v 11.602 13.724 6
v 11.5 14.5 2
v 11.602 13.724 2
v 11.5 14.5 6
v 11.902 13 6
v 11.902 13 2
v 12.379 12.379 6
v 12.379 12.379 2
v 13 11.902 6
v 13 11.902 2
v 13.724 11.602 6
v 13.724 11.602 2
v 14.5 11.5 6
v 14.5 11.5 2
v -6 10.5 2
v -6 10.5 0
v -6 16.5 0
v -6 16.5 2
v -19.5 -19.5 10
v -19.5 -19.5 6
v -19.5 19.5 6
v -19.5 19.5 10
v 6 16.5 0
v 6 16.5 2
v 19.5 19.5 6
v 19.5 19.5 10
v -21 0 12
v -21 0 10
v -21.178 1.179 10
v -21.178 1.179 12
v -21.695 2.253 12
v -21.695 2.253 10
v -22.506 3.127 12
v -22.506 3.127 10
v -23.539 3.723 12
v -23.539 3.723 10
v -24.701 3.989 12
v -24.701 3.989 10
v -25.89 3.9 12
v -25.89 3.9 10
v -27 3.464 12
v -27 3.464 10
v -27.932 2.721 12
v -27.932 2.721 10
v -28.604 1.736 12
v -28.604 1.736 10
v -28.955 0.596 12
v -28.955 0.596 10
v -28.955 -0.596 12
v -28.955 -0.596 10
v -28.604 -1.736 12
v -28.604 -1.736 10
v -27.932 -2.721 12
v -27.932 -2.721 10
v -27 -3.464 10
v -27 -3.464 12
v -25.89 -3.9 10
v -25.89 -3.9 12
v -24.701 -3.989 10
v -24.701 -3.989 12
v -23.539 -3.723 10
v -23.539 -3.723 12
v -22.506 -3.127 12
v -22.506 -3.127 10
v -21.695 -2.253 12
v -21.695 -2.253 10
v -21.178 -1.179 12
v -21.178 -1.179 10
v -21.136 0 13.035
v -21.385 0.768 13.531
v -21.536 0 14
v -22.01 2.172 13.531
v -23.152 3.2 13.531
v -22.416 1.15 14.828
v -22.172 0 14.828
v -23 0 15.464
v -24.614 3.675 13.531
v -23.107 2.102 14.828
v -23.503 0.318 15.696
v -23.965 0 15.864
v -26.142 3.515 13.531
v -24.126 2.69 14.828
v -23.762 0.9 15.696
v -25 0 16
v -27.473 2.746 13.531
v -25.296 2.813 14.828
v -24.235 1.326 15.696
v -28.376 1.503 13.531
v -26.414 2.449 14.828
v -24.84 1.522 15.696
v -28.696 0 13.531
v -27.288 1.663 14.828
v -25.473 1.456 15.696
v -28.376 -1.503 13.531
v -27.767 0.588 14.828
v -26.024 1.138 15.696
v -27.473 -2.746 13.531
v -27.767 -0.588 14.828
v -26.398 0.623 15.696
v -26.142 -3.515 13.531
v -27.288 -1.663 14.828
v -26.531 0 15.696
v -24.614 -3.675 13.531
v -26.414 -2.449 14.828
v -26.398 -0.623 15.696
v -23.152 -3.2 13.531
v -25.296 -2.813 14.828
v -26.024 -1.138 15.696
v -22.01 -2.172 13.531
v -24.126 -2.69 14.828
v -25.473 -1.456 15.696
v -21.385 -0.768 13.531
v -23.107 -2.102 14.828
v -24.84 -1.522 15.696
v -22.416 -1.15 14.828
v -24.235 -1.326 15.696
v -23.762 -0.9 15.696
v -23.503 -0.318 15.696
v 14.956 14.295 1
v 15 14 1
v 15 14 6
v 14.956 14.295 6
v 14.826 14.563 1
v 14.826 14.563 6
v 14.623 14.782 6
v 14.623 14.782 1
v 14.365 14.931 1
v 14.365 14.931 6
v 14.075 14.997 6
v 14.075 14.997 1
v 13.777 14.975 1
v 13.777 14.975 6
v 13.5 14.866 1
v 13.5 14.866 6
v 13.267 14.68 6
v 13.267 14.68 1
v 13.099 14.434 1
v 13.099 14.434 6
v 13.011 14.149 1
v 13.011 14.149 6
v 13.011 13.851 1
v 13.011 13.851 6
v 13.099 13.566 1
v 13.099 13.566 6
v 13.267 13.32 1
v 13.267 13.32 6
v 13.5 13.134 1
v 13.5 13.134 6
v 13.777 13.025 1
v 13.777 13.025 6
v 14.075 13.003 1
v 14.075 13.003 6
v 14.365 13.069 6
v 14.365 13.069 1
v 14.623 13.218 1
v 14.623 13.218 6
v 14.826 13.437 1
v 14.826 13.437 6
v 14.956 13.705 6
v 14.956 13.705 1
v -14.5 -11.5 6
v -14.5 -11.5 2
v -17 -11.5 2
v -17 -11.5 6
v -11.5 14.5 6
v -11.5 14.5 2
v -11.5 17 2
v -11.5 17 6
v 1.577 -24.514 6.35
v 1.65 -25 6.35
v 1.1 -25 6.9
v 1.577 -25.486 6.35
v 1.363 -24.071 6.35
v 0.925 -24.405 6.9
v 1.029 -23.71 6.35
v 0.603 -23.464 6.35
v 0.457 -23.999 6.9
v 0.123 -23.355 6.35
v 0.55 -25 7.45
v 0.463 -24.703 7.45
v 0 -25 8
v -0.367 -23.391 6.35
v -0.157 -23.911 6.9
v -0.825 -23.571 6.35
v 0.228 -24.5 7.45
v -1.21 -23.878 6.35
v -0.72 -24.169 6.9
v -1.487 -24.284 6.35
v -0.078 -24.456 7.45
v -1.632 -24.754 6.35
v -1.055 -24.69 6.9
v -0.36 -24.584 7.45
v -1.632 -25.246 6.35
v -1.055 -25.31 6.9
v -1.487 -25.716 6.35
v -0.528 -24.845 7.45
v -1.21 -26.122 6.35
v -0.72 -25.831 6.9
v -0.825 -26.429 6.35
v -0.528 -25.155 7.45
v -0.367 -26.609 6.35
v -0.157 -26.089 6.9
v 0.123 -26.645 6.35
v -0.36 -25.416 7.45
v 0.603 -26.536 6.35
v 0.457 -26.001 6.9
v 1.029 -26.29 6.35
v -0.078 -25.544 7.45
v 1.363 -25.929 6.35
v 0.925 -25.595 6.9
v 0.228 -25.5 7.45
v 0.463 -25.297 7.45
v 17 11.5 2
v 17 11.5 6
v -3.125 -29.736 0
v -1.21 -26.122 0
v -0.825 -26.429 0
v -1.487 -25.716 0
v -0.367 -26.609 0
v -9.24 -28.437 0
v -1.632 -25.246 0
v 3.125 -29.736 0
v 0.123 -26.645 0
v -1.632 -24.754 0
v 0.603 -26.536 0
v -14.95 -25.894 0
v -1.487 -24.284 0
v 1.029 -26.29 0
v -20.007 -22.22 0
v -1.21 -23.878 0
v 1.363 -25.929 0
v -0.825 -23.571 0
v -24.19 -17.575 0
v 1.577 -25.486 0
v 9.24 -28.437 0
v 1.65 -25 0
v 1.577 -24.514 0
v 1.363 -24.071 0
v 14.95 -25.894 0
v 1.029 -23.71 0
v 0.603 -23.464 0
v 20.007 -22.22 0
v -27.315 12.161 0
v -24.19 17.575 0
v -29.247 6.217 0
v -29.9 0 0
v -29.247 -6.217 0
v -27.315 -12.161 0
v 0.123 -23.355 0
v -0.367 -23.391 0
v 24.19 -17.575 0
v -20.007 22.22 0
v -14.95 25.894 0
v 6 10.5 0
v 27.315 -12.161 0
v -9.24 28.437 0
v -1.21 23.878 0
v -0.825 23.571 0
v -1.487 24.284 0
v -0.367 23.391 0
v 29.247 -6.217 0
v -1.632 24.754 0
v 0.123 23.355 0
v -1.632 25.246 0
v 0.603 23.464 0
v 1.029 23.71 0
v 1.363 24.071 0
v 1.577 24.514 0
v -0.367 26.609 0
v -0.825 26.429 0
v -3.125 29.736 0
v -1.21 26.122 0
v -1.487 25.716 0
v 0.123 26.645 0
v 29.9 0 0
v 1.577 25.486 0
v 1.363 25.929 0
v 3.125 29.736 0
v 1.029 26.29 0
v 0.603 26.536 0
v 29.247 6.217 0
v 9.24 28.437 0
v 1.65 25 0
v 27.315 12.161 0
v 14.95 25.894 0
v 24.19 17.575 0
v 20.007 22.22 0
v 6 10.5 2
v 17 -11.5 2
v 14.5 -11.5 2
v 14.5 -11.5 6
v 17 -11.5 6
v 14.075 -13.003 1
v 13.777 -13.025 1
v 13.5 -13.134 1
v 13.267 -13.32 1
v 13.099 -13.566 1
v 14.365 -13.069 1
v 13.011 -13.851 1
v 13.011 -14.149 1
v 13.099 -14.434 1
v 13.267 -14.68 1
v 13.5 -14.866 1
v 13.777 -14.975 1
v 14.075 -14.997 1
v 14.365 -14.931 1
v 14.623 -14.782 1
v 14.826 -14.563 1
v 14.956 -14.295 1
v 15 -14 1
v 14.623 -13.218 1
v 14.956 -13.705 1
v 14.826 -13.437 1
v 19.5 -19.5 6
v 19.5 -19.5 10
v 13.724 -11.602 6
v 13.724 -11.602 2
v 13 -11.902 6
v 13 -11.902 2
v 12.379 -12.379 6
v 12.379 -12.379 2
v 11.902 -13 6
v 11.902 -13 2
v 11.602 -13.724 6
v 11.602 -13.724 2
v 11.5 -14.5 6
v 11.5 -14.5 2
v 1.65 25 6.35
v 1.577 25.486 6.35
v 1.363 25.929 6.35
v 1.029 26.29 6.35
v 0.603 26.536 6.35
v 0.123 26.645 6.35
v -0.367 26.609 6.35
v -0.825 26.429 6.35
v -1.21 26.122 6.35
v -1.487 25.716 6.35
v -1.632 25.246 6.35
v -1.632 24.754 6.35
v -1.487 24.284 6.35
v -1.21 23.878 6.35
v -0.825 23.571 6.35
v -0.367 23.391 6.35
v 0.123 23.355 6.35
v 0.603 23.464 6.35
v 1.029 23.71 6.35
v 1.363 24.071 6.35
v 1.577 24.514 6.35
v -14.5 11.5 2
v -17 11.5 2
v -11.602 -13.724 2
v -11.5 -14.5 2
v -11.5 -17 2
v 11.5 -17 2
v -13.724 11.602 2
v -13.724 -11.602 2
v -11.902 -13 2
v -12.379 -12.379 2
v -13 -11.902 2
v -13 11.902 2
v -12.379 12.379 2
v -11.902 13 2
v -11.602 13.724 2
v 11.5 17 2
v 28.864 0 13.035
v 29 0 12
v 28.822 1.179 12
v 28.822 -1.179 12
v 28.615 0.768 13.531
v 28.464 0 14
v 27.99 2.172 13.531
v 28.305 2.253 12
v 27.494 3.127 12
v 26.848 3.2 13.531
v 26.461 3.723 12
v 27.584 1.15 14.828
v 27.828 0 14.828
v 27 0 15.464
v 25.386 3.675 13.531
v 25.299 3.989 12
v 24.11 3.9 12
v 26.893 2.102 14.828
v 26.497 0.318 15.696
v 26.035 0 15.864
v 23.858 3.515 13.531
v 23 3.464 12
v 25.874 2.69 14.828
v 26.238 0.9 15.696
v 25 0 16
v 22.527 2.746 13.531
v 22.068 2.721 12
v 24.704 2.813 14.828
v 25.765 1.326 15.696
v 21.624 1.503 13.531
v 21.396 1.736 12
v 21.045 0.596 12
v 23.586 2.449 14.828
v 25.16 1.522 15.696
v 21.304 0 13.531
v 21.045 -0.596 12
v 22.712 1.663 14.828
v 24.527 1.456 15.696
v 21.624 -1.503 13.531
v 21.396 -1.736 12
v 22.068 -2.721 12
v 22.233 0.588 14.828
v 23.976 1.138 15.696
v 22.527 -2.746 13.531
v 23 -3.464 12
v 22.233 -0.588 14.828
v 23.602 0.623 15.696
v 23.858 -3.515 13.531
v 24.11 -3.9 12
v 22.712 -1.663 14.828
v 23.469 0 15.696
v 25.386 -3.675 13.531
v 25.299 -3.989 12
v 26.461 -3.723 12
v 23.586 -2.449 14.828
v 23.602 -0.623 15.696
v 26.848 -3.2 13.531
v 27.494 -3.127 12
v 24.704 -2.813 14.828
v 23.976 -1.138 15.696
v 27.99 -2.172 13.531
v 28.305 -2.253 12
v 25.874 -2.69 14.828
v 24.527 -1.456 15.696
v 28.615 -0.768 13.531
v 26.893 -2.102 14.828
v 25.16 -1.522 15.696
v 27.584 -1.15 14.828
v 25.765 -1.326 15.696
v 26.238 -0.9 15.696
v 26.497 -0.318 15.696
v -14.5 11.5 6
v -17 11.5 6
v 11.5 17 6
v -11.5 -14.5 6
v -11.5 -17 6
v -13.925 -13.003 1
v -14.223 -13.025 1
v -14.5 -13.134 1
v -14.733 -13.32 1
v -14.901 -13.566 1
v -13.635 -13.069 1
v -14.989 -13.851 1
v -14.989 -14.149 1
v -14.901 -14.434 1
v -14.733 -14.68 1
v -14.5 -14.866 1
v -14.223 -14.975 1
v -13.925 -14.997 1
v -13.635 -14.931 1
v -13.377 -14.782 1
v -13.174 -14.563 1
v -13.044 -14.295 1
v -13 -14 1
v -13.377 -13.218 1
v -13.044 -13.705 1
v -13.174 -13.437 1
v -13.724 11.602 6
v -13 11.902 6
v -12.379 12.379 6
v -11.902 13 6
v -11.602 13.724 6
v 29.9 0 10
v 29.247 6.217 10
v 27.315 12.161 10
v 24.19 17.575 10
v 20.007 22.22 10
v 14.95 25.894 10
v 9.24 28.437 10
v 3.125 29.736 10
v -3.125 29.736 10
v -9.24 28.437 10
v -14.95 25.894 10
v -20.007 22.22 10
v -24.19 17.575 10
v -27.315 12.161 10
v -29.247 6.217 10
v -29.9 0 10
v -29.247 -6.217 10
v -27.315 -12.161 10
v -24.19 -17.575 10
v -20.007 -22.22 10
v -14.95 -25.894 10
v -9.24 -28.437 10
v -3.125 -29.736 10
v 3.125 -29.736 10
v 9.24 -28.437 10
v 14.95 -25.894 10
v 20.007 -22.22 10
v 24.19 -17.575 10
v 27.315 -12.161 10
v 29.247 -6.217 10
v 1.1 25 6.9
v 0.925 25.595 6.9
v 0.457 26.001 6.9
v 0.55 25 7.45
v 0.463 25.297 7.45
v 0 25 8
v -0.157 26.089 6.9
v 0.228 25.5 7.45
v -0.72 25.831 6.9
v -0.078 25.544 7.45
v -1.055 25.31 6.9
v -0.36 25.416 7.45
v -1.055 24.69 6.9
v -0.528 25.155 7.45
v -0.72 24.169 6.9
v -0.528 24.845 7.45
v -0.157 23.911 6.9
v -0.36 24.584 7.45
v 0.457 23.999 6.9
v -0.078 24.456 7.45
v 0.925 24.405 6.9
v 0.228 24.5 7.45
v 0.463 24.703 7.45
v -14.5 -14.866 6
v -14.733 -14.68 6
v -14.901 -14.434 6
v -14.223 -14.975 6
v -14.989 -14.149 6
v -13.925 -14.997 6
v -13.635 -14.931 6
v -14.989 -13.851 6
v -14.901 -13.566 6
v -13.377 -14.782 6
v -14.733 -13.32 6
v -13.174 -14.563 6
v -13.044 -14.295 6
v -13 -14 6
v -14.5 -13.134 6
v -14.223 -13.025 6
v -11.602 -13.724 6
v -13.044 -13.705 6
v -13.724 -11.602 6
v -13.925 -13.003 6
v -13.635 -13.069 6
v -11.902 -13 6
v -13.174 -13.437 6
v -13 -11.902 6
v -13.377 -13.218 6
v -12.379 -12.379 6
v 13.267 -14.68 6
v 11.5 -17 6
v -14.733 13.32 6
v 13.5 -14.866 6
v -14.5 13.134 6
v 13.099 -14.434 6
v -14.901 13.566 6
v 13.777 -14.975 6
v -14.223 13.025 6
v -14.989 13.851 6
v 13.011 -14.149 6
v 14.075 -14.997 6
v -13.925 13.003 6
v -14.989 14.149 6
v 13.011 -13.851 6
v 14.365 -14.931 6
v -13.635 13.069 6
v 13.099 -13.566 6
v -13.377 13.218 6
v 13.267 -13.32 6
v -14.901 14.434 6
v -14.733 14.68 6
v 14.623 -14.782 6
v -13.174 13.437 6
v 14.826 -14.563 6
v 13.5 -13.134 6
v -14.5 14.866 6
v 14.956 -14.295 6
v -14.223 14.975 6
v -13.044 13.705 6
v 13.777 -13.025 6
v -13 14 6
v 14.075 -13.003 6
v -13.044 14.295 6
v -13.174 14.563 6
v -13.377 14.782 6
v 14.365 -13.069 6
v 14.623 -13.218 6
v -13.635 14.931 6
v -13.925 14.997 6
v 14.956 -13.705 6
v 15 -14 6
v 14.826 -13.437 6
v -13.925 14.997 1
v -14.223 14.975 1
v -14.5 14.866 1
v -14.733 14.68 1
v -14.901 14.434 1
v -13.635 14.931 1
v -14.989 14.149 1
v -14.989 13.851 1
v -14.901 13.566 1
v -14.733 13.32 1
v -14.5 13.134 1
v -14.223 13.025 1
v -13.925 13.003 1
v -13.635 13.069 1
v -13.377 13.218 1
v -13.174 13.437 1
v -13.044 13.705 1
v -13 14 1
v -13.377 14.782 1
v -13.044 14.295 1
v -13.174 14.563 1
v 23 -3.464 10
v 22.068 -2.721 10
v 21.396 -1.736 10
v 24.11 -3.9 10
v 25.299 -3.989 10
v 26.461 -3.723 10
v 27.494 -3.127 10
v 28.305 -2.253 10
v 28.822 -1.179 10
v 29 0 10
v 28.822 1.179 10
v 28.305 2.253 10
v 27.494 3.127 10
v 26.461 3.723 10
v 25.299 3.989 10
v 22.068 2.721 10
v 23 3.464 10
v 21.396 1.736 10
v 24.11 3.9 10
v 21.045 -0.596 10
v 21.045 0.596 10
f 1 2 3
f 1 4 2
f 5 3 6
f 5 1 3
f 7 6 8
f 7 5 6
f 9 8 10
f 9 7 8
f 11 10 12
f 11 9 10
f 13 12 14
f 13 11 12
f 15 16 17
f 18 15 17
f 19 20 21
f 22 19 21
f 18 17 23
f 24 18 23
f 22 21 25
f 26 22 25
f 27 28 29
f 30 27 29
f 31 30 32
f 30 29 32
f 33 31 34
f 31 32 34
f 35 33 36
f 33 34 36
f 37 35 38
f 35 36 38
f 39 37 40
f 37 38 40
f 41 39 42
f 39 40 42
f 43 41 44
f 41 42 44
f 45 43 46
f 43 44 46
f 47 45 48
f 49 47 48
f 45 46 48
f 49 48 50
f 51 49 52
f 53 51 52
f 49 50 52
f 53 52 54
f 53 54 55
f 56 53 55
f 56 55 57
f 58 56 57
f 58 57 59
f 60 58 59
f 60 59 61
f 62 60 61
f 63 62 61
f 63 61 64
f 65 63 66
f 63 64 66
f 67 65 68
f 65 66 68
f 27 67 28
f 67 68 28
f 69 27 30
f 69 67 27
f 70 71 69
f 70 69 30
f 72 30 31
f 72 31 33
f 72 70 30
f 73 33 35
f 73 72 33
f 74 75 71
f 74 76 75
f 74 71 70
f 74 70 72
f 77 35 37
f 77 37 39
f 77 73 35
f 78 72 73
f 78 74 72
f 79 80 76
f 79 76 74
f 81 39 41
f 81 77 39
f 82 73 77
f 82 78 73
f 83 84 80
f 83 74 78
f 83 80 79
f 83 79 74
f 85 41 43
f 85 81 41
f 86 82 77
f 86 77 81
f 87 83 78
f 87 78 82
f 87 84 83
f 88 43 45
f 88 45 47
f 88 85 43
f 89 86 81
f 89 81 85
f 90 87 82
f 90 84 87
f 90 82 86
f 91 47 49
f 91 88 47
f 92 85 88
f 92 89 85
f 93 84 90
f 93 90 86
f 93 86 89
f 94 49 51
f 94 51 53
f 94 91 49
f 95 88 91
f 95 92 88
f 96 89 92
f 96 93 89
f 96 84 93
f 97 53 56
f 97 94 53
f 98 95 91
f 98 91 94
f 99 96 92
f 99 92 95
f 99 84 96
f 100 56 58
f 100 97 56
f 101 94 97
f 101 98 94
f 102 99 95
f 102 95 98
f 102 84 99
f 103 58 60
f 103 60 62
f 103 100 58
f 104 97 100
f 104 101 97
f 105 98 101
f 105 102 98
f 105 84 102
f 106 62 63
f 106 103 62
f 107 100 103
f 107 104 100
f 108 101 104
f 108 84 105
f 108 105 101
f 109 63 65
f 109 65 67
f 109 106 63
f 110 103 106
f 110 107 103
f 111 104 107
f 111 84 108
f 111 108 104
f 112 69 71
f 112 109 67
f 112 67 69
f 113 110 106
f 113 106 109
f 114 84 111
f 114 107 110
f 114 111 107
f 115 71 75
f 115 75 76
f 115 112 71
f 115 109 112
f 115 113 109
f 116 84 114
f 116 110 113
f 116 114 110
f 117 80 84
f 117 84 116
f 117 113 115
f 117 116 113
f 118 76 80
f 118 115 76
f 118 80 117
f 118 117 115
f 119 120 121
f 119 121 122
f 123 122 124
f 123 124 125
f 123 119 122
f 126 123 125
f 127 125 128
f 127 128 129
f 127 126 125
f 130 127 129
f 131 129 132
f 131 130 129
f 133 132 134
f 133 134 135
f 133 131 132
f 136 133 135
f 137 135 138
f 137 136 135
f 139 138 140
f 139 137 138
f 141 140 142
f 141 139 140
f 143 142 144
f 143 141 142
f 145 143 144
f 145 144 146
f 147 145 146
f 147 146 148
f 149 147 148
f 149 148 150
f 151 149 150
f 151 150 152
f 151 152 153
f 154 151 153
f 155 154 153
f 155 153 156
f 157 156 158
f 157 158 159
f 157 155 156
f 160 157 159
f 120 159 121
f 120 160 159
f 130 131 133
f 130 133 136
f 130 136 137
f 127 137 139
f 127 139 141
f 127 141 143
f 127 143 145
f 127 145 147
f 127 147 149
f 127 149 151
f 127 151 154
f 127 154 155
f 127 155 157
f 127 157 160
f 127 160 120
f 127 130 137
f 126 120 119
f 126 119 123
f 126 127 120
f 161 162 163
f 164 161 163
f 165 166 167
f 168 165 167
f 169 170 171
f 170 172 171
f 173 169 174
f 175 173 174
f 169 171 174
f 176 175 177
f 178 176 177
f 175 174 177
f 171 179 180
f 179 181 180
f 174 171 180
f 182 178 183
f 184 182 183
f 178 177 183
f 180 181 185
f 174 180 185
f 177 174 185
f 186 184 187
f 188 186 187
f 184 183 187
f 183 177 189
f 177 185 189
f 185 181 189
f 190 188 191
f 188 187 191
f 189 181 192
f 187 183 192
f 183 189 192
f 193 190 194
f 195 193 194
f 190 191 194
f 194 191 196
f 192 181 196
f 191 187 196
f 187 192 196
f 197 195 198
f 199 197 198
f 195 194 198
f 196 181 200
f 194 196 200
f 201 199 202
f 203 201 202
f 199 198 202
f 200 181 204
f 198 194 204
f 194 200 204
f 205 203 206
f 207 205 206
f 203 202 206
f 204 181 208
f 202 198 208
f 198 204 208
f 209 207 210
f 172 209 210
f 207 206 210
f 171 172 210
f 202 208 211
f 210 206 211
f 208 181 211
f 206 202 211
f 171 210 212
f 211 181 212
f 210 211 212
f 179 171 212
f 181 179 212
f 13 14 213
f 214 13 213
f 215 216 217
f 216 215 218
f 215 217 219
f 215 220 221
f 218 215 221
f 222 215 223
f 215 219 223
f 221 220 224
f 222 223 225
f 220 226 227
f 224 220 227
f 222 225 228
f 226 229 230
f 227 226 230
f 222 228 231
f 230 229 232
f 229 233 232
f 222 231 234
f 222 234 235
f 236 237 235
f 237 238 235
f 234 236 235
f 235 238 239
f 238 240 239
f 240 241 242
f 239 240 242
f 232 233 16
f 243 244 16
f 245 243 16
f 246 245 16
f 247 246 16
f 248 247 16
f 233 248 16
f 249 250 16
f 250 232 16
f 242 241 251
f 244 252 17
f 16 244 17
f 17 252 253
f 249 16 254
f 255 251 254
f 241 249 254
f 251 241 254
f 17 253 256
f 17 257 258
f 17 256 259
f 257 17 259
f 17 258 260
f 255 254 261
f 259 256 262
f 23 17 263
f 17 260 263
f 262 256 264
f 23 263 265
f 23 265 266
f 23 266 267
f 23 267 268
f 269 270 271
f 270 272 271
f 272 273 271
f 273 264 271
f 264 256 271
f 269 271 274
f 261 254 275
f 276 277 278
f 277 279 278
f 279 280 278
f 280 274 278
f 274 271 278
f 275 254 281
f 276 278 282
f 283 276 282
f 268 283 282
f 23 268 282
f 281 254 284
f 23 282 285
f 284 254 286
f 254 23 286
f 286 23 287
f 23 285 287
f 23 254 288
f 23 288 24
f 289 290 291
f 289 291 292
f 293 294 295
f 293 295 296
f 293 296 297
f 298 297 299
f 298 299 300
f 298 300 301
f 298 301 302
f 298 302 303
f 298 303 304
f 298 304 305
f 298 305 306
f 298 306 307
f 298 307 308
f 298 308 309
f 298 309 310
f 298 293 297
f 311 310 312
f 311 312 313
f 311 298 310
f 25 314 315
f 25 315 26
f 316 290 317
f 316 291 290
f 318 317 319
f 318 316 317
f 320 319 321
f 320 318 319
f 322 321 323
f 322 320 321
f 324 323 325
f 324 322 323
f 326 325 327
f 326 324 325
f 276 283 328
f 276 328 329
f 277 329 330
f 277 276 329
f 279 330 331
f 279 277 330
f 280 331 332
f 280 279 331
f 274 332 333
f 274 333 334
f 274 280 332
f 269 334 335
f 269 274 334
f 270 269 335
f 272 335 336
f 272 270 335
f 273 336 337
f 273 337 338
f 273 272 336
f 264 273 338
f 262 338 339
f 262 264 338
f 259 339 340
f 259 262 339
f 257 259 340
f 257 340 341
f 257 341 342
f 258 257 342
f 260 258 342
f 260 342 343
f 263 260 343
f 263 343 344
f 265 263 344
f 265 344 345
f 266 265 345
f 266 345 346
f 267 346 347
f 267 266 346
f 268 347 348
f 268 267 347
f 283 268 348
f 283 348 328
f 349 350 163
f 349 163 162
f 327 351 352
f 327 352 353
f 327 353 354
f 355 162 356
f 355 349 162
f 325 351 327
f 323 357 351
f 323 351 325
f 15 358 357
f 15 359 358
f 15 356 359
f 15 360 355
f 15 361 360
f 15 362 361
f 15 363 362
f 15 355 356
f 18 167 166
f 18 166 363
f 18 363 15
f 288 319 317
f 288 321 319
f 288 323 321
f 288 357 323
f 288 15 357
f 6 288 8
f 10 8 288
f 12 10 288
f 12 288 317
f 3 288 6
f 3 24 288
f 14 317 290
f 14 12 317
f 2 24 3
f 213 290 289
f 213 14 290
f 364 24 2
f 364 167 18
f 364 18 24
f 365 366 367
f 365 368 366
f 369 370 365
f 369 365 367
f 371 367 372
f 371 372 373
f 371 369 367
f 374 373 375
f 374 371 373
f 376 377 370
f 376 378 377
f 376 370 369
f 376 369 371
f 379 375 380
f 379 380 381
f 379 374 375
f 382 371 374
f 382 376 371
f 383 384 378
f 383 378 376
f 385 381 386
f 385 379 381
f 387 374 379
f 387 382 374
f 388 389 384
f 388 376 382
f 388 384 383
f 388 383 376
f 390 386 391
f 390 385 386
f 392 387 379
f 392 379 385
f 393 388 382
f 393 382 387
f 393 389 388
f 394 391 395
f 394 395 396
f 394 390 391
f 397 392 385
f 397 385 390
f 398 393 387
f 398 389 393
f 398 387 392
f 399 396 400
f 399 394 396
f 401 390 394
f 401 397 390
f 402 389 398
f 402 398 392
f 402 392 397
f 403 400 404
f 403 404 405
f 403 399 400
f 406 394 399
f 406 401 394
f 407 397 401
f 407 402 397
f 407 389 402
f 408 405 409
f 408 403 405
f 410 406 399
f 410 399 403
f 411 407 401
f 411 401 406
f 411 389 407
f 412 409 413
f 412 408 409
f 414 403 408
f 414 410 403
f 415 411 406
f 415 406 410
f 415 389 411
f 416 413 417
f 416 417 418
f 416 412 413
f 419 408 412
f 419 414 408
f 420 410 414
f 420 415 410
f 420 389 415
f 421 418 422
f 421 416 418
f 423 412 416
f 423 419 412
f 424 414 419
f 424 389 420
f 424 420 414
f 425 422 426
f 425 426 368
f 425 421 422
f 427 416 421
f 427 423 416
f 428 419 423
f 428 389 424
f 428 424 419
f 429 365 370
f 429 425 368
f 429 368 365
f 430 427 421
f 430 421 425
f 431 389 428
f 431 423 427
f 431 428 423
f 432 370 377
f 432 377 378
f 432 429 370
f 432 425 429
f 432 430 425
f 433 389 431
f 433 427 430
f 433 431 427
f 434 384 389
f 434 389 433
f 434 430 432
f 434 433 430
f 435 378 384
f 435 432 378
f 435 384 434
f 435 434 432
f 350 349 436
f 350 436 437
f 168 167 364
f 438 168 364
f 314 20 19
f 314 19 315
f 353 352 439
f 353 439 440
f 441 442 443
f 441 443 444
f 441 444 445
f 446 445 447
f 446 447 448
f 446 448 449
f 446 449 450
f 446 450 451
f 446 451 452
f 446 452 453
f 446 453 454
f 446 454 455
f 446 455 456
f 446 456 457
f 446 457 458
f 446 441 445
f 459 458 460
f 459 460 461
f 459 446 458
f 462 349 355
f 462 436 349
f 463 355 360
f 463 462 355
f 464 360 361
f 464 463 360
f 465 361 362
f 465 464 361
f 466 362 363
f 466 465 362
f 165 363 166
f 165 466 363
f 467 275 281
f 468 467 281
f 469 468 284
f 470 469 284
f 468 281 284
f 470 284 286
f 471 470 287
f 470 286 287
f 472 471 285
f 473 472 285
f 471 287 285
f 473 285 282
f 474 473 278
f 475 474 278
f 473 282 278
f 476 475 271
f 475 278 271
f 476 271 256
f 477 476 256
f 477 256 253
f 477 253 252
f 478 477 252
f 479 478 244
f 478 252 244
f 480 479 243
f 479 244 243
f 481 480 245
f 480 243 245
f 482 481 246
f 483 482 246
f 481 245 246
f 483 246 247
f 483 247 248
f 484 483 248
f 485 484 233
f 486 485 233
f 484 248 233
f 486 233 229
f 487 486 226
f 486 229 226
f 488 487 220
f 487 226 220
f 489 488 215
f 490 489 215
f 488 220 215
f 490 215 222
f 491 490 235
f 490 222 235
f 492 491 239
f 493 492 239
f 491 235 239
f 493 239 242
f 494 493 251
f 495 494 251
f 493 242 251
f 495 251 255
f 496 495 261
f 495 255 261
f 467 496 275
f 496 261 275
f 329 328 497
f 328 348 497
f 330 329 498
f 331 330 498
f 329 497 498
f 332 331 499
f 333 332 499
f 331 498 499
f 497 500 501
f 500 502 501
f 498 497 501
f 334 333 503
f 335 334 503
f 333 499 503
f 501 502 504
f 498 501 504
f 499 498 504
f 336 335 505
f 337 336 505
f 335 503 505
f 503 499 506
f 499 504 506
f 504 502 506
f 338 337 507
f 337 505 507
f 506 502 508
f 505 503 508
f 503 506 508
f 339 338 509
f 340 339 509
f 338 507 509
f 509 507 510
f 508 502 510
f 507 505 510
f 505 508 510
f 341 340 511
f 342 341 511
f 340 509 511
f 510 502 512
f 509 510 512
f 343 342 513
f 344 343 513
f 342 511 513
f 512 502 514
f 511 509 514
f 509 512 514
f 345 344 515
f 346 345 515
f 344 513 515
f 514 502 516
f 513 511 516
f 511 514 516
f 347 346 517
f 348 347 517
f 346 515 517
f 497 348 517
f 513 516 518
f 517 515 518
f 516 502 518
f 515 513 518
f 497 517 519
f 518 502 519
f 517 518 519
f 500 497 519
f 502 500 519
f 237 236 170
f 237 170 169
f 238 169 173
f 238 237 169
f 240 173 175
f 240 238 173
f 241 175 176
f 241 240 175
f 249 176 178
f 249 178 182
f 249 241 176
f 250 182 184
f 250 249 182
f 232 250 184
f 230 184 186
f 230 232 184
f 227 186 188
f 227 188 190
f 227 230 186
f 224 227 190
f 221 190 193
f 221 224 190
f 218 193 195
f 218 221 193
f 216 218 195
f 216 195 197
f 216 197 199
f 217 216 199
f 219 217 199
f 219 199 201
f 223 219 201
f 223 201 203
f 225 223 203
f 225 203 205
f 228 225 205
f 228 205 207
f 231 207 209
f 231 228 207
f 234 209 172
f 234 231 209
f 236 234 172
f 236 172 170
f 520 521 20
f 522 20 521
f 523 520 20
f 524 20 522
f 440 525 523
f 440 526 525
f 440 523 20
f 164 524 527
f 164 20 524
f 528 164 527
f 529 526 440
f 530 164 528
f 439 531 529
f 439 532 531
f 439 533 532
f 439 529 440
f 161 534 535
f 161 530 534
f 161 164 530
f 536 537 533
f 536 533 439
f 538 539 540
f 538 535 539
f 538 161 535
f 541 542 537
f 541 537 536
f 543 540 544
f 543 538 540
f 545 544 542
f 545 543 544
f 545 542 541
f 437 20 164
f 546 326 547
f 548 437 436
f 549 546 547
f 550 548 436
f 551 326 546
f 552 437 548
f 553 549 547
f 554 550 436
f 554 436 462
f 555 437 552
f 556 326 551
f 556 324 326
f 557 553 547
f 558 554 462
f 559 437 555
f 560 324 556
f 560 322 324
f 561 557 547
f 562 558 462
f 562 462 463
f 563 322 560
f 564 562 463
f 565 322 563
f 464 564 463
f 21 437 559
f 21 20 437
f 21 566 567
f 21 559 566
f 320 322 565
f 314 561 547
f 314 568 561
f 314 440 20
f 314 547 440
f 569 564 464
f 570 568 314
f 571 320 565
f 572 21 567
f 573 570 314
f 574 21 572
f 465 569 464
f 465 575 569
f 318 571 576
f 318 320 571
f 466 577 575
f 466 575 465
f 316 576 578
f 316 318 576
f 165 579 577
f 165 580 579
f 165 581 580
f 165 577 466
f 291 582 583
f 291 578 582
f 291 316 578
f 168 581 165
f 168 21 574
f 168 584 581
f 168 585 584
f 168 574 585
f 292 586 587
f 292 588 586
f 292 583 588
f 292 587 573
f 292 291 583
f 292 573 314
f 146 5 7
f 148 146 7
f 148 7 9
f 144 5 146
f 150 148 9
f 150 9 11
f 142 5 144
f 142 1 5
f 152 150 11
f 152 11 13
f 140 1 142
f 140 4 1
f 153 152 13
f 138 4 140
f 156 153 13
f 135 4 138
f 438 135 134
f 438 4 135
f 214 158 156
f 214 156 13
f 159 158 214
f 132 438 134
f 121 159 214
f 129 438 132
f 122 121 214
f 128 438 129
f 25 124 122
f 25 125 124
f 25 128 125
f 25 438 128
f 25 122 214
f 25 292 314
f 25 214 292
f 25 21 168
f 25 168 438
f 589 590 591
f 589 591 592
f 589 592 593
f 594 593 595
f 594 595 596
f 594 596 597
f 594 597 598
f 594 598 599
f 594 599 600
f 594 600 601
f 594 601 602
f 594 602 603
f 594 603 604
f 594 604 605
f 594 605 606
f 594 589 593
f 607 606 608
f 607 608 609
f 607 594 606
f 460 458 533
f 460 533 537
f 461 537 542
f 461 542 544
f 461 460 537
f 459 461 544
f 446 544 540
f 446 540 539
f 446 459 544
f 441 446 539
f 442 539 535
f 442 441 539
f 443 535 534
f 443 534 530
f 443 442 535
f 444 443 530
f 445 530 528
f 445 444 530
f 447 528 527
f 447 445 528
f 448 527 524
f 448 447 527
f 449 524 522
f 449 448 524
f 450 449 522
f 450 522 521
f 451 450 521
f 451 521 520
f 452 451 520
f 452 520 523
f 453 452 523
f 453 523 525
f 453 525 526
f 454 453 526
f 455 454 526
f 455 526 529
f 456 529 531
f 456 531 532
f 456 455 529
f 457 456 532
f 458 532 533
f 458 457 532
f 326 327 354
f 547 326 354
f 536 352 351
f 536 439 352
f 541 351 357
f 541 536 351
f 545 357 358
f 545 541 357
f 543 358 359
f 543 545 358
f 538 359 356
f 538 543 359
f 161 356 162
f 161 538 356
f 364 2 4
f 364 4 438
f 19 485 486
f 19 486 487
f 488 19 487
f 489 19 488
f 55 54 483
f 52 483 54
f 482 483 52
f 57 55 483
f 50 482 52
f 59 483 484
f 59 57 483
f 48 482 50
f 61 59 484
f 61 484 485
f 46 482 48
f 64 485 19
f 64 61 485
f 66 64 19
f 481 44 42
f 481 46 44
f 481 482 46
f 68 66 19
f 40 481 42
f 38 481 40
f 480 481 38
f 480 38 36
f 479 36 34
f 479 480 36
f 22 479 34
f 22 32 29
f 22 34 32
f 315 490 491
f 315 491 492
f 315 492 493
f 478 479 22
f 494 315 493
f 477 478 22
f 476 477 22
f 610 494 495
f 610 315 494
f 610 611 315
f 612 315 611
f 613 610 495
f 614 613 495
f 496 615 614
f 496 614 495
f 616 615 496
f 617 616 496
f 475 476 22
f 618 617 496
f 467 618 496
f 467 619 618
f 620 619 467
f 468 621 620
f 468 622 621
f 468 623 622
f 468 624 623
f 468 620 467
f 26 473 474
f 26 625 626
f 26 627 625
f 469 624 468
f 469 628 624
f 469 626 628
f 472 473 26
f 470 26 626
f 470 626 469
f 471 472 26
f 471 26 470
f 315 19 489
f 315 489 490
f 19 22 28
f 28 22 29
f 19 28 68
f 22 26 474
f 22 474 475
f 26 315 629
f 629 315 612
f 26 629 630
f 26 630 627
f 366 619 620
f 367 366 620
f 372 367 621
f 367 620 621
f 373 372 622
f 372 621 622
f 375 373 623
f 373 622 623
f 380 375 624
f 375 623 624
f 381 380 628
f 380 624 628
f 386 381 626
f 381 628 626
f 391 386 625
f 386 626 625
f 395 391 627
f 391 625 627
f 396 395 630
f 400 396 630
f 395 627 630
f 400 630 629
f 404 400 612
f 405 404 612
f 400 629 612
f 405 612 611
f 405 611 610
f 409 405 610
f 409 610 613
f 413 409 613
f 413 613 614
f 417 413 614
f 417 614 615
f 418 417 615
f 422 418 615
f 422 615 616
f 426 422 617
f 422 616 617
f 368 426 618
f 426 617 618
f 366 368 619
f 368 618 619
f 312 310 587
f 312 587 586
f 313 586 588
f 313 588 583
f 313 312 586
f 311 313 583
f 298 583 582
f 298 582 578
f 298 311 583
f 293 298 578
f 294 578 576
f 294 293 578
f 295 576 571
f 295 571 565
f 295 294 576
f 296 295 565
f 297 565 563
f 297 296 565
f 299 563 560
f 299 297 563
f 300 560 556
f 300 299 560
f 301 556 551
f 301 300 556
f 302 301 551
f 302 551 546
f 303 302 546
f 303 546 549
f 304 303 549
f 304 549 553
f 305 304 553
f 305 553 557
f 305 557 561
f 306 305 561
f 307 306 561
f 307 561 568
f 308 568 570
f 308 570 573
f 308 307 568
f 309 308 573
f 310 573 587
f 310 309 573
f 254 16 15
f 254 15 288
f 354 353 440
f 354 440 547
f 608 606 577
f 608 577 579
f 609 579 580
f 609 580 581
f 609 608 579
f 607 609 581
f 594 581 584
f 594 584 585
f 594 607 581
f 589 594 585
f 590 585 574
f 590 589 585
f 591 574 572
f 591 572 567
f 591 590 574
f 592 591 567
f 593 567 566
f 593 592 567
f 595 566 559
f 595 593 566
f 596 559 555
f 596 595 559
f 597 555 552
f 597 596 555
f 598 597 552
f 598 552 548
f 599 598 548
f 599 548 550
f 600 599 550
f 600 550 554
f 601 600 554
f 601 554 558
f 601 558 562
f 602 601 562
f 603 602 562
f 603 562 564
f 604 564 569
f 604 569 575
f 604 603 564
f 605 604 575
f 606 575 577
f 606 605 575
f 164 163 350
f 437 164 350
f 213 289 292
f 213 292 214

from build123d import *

# Parameters (mm, degrees)
CYLINDER003_R             = 1
CYLINDER003_DEPTH         = 5
CYLINDER001_R             = 1
CYLINDER001_DEPTH         = 5
CYLINDER002_R             = 1
CYLINDER002_DEPTH         = 5
BOX_W                     = 12
BOX_H                     = 6
BOX_DEPTH                 = 2
CYLINDER009_R             = 1.65
CYLINDER009_DEPTH         = 8
CHAMFER_SIZE              = 1.65
CYLINDER010_R             = 1.65
CYLINDER010_DEPTH         = 8
CHAMFER001_SIZE           = 1.65
CYLINDER_R                = 1
CYLINDER_DEPTH            = 5
BOX003_W                  = 34
BOX003_H                  = 34
BOX003_DEPTH              = 8
BOX002_W                  = 39
BOX002_H                  = 39
BOX002_DEPTH              = 4
CYLINDER004_R             = 29.9
CYLINDER004_DEPTH         = 10
CYLINDER006_R             = 4
CYLINDER006_DEPTH         = 6
FILLET004_R               = 4
CYLINDER008_R             = 4
CYLINDER008_DEPTH         = 6
FILLET005_R               = 4
BOX004_W                  = 5.5
BOX004_H                  = 5.5
BOX004_DEPTH              = 4
FILLET002_R               = 3
FILLET002_PLACEMENT_ANGLE = 180
FILLET001_R               = 3
FILLET001_PLACEMENT_ANGLE = 90
FILLET_R                  = 3
FILLET003_R               = 3
FILLET003_PLACEMENT_ANGLE = 90


with BuildPart() as cylinder003:
    # Cylinder003 → Cylinder003 (new body)
    with BuildSketch(Plane(origin=(14, -14, 1), x_dir=(1, 0, 0), z_dir=(0, 0, 1))):
        Circle(CYLINDER003_R)
    extrude(amount=CYLINDER003_DEPTH)


with BuildPart() as cylinder001:
    # Cylinder001 → Cylinder001 (new body)
    with BuildSketch(Plane(origin=(-14, 14, 1), x_dir=(1, 0, 0), z_dir=(0, 0, 1))):
        Circle(CYLINDER001_R)
    extrude(amount=CYLINDER001_DEPTH)


with BuildPart() as cylinder002:
    # Cylinder002 → Cylinder002 (new body)
    with BuildSketch(Plane(origin=(-14, -14, 1), x_dir=(1, 0, 0), z_dir=(0, 0, 1))):
        Circle(CYLINDER002_R)
    extrude(amount=CYLINDER002_DEPTH)


with BuildPart() as aussparung_usb_kabel:
    # Box → Box (new body)
    with BuildSketch(Plane(origin=(-6, 10.5, 0), x_dir=(1, 0, 0), z_dir=(0, 0, 1))):
        with Locations((6, 3)):
            Rectangle(BOX_W, BOX_H)
    extrude(amount=BOX_DEPTH)


with BuildPart() as chamfer001:
    # Cylinder009 → Cylinder009 (new body)
    with BuildSketch(Plane(origin=(0, -25, 0), x_dir=(1, 0, 0), z_dir=(0, 0, 1))):
        Circle(CYLINDER009_R)
    extrude(amount=CYLINDER009_DEPTH)

    # Chamfer
    chamfer_edges = [chamfer001.edges().sort_by_distance(p)[0] for p in [
        (-1.65, -25, 8),
    ]]
    chamfer(chamfer_edges, length=CHAMFER_SIZE)


with BuildPart() as chamfer002:
    # Cylinder010 → Cylinder010 (new body)
    with BuildSketch(Plane(origin=(0, 25, 0), x_dir=(1, 0, 0), z_dir=(0, 0, 1))):
        Circle(CYLINDER010_R)
    extrude(amount=CYLINDER010_DEPTH)

    # Chamfer001
    chamfer001_edges = [chamfer002.edges().sort_by_distance(p)[0] for p in [
        (-1.65, 25, 8),
    ]]
    chamfer(chamfer001_edges, length=CHAMFER001_SIZE)


with BuildPart() as bohrloecher:
    # Cylinder → Cylinder (new body)
    with BuildSketch(Plane(origin=(14, 14, 1), x_dir=(1, 0, 0), z_dir=(0, 0, 1))):
        Circle(CYLINDER_R)
    extrude(amount=CYLINDER_DEPTH)

    # Fusion: union Cylinder003, Cylinder001, Cylinder002, Aussparung_USB_Kabel, Chamfer001, Chamfer002
    add(cylinder003.part)
    add(cylinder001.part)
    add(cylinder002.part)
    add(aussparung_usb_kabel.part)
    add(chamfer001.part)
    add(chamfer002.part)


with BuildPart() as rahmen_innen:
    # Box003 → Box003 (new body)
    with BuildSketch(Plane(origin=(-17, -17, 2), x_dir=(1, 0, 0), z_dir=(0, 0, 1))):
        with Locations((17, 17)):
            Rectangle(BOX003_W, BOX003_H)
    extrude(amount=BOX003_DEPTH)


with BuildPart() as rahmen_aussen:
    # Box002 → Box002 (new body)
    with BuildSketch(Plane(origin=(-19.5, -19.5, 6), x_dir=(1, 0, 0), z_dir=(0, 0, 1))):
        with Locations((19.5, 19.5)):
            Rectangle(BOX002_W, BOX002_H)
    extrude(amount=BOX002_DEPTH)


with BuildPart() as cut001:
    # Cylinder004 → Cylinder004 (new body)
    with BuildSketch(Plane.XY):
        Circle(CYLINDER004_R)
    extrude(amount=CYLINDER004_DEPTH)

    # Cut: cut Rahmen_Aussen
    add(rahmen_aussen.part, mode=Mode.SUBTRACT)

    # Cut001: cut Rahmen_Innen
    add(rahmen_innen.part, mode=Mode.SUBTRACT)


with BuildPart() as fillet004:
    # Cylinder006 → Cylinder006 (new body)
    with BuildSketch(Plane(origin=(-25, 0, 10), x_dir=(1, 0, 0), z_dir=(0, 0, 1))):
        Circle(CYLINDER006_R)
    extrude(amount=CYLINDER006_DEPTH)

    # Fillet004
    fillet004_edges = [fillet004.edges().sort_by_distance(p)[0] for p in [
        (-29, 0, 16),
    ]]
    fillet(fillet004_edges, radius=FILLET004_R)


with BuildPart() as fillet005:
    # Cylinder008 → Cylinder008 (new body)
    with BuildSketch(Plane(origin=(25, 0, 10), x_dir=(1, 0, 0), z_dir=(0, 0, 1))):
        Circle(CYLINDER008_R)
    extrude(amount=CYLINDER008_DEPTH)

    # Fillet005
    fillet005_edges = [fillet005.edges().sort_by_distance(p)[0] for p in [
        (21, 0, 16),
    ]]
    fillet(fillet005_edges, radius=FILLET005_R)


with BuildPart() as w_rfel_eck:
    # Box004 → Box004 (new body)
    with BuildSketch(Plane(origin=(11.5, 11.5, 2), x_dir=(1, 0, 0), z_dir=(0, 0, 1))):
        with Locations((2.75, 2.75)):
            Rectangle(BOX004_W, BOX004_H)
    extrude(amount=BOX004_DEPTH)


with BuildPart() as fillet002:
    # Fillet002 base: copy of Würfel_Eck
    add(w_rfel_eck.part)

    # Fillet002
    fillet002_edges = [fillet002.edges().sort_by_distance(p)[0] for p in [
        (11.5, 11.5, 4),
    ]]
    fillet(fillet002_edges, radius=FILLET002_R)


with BuildPart() as fillet002_1:
    # Fillet002 placement: moved
    add(fillet002.part.rotate(Axis((0, 0, 0), (0, 0, 1)), FILLET002_PLACEMENT_ANGLE))


with BuildPart() as fillet001:
    # Fillet001 base: copy of Würfel_Eck
    add(w_rfel_eck.part)

    # Fillet001
    fillet001_edges = [fillet001.edges().sort_by_distance(p)[0] for p in [
        (11.5, 11.5, 4),
    ]]
    fillet(fillet001_edges, radius=FILLET001_R)


with BuildPart() as fillet001_1:
    # Fillet001 placement: moved
    add(fillet001.part.rotate(Axis((0, 0, 0), (0, 0, 1)), FILLET001_PLACEMENT_ANGLE))


with BuildPart() as fillet_body:
    # Fillet base: copy of Würfel_Eck
    add(w_rfel_eck.part)

    # Fillet
    fillet_edges = [fillet_body.edges().sort_by_distance(p)[0] for p in [
        (11.5, 11.5, 4),
    ]]
    fillet(fillet_edges, radius=FILLET_R)


with BuildPart() as cut002:
    # Fillet003 base: copy of Würfel_Eck
    add(w_rfel_eck.part)

    # Fillet003
    fillet003_edges = [cut002.edges().sort_by_distance(p)[0] for p in [
        (11.5, 11.5, 4),
    ]]
    fillet(fillet003_edges, radius=FILLET003_R)


with BuildPart() as cut002_1:
    # Fillet003 placement: moved
    add(cut002.part.rotate(Axis((0, 0, 0), (0, 0, -1)), FILLET003_PLACEMENT_ANGLE))

    # Fusion001: union Fillet002, Fillet001, Fillet body
    add(fillet002_1.part)
    add(fillet001_1.part)
    add(fillet_body.part)

    # Fusion002: union Cut001, Fillet004, Fillet005
    add(cut001.part)
    add(fillet004.part)
    add(fillet005.part)

    # Cut002: cut Bohrloecher
    add(bohrloecher.part, mode=Mode.SUBTRACT)


solid = cut002_1.part
